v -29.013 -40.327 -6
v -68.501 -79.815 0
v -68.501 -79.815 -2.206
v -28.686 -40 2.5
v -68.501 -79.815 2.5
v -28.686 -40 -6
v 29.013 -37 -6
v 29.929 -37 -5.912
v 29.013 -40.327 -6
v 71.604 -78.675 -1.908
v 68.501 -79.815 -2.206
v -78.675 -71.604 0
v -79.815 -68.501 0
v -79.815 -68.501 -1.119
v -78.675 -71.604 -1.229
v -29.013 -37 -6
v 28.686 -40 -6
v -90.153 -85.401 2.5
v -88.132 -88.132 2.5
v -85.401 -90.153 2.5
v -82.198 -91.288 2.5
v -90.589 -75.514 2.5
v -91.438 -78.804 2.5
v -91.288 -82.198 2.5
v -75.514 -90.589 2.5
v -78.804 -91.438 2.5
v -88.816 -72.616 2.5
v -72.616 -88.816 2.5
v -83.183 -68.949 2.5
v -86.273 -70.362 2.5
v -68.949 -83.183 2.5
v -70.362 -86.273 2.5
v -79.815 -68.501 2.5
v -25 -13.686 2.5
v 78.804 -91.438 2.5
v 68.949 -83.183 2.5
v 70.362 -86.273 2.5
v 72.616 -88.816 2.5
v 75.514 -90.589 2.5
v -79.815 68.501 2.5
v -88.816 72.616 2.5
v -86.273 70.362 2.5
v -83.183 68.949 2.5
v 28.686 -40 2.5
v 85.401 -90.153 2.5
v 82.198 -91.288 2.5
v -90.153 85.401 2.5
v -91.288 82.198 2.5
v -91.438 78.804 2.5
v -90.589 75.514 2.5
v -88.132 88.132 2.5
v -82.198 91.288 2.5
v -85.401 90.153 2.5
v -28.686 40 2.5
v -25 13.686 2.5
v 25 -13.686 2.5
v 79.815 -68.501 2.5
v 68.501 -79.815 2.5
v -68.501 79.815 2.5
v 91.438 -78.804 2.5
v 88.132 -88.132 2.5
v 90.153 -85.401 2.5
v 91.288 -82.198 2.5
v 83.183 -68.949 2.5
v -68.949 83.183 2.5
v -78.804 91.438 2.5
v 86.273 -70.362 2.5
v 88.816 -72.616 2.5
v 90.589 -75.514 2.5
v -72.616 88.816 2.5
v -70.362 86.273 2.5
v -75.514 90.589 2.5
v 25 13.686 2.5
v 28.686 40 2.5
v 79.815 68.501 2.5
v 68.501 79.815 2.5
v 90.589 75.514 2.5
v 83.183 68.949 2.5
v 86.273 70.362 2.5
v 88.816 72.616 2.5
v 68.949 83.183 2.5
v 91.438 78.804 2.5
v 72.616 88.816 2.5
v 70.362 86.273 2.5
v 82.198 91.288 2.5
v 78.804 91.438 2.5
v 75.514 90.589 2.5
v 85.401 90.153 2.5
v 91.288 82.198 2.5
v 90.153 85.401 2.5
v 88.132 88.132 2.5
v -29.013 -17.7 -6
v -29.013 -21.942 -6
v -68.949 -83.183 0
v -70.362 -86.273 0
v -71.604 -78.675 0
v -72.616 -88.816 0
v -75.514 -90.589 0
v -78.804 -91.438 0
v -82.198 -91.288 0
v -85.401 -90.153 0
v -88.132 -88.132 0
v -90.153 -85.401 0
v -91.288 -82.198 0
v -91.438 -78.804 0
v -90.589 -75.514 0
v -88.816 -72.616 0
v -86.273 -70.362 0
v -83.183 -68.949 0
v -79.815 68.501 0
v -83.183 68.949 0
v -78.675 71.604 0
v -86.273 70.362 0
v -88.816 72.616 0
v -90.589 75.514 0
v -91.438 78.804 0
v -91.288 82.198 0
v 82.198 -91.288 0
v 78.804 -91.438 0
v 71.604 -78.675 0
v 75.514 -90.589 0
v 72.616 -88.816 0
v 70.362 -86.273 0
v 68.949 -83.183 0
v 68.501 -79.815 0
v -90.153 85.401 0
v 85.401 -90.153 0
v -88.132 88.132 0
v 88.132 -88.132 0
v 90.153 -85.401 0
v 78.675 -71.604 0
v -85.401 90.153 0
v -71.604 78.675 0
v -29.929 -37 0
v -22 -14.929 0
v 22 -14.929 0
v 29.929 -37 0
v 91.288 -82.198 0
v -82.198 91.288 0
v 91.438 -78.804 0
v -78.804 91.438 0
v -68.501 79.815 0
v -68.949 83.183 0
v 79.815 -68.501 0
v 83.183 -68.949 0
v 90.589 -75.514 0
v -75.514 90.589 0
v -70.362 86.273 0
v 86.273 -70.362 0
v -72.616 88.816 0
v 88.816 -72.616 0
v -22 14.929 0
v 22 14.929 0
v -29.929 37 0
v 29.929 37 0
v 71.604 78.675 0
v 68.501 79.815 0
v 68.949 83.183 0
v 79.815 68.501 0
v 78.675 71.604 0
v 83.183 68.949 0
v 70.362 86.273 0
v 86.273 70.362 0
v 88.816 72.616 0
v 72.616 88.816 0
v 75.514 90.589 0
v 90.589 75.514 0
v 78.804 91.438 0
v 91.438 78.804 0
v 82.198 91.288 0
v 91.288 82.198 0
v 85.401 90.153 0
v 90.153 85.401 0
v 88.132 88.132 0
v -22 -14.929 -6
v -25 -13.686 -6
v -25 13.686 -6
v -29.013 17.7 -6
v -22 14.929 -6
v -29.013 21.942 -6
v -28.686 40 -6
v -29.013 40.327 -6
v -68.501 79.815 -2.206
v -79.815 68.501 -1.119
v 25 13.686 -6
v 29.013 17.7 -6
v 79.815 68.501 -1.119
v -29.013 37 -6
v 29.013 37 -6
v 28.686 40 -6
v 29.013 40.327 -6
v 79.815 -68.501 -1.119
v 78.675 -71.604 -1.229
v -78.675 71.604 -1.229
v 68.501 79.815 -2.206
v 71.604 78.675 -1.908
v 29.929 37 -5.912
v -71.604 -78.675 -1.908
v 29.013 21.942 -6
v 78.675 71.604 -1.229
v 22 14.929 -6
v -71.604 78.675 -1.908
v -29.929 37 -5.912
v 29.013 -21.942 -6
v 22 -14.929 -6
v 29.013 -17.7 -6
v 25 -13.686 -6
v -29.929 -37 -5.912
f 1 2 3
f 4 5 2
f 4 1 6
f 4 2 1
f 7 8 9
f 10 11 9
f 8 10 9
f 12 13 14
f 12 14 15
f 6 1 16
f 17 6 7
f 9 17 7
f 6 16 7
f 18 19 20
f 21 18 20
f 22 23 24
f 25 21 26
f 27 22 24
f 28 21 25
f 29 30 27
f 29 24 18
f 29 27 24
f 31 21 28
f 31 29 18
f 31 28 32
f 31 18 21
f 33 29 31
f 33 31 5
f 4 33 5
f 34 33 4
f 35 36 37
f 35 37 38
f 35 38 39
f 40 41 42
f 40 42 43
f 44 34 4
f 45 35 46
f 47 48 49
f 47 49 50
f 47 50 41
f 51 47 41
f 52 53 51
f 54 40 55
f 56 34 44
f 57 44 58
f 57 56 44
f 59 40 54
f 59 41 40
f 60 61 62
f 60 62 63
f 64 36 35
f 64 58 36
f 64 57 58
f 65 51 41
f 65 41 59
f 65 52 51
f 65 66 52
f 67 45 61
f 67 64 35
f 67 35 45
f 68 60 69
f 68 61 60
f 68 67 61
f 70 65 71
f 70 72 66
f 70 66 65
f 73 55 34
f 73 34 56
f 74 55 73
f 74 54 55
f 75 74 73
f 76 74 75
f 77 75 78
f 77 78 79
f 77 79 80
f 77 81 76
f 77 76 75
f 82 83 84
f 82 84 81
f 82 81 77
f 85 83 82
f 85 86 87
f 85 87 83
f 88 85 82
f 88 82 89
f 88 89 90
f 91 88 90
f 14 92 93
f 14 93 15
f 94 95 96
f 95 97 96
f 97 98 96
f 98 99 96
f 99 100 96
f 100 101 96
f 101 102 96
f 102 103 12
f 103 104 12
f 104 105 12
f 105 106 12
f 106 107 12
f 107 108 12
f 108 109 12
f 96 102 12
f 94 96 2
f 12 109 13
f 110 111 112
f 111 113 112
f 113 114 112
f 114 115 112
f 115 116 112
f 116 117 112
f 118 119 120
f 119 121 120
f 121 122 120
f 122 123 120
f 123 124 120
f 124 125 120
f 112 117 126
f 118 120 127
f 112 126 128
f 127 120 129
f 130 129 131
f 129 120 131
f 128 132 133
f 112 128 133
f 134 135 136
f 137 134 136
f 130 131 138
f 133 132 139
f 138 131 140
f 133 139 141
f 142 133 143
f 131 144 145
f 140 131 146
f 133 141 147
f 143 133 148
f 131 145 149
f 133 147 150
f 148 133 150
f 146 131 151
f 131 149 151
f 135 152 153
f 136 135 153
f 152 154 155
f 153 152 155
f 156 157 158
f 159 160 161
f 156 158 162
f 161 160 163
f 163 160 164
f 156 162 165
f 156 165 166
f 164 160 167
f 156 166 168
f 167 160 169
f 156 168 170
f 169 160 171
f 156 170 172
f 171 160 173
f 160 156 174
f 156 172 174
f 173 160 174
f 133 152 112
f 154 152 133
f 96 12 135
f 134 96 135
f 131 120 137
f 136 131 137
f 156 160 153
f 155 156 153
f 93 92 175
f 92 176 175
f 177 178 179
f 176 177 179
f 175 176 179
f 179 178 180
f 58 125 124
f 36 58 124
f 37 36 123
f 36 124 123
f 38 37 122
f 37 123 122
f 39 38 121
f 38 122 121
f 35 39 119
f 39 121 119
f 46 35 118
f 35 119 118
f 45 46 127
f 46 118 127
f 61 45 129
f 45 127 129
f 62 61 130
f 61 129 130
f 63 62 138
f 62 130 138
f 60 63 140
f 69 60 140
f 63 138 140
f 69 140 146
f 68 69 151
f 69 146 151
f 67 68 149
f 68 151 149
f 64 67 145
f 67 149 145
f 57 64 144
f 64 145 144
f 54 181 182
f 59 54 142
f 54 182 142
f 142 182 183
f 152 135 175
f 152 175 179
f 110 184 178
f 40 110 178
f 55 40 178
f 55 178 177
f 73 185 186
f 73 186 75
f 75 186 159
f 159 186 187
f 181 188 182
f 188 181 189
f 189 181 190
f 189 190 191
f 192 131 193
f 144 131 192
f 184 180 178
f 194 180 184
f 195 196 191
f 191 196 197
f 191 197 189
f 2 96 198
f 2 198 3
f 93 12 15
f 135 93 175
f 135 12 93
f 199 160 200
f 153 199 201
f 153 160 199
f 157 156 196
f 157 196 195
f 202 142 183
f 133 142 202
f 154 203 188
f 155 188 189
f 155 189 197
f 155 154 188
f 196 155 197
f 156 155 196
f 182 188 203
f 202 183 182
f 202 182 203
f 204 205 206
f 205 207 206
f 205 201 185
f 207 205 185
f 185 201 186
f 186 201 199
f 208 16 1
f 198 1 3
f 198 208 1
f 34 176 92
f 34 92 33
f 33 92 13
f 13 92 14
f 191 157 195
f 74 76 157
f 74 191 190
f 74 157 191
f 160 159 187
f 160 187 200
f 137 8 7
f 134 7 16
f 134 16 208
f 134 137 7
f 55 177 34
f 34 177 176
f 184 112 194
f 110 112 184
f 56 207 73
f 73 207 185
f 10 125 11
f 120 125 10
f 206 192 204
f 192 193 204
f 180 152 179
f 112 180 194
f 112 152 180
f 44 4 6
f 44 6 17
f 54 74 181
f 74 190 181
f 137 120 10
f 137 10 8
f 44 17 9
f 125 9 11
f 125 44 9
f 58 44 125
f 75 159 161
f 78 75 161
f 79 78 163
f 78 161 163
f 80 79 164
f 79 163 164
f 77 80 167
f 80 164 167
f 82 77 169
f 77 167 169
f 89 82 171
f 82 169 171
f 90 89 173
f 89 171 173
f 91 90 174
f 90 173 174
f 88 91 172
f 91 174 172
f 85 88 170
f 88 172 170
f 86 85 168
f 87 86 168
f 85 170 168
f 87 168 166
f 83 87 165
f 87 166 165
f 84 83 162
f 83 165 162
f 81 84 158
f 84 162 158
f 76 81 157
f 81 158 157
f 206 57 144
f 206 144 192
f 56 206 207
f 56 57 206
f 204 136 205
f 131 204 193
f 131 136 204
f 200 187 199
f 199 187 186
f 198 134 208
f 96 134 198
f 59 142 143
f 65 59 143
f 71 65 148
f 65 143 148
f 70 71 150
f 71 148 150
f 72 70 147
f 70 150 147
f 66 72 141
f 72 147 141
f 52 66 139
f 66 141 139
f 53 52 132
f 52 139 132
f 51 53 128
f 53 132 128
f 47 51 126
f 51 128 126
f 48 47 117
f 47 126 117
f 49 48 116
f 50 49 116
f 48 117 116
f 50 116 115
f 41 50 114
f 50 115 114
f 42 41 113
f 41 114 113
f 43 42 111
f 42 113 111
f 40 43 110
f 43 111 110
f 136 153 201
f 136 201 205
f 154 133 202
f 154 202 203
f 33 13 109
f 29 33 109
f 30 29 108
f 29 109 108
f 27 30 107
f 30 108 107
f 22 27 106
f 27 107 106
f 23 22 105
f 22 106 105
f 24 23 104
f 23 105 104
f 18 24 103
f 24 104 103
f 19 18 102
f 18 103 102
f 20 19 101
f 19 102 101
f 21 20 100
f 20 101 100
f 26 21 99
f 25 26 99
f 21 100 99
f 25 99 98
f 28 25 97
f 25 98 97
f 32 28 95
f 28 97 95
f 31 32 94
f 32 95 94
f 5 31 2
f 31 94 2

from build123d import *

# Parameters (mm, degrees)
F1_DEPTH = 2.5
F3_DEPTH = 6
F5_DEPTH = 100


with BuildPart() as f1:
    # F0 (on Top) → F1 (new body)
    with BuildSketch(Plane.XY):
        with BuildLine():
            Line((-79.815194, 68.501485), (-25, 13.686292))
            Line((-25, 13.686292), (-25, -13.686292))
            Line((-25, -13.686292), (-79.815194, -68.501485))
            ThreePointArc((-79.815194, -68.501485), (-88.131728, -88.131728), (-68.501485, -79.815194))
            Line((-68.501485, -79.815194), (-28.686292, -40))
            Line((-28.686292, -40), (28.686292, -40))
            Line((28.686292, -40), (68.501485, -79.815194))
            ThreePointArc((68.501485, -79.815194), (88.131728, -88.131728), (79.815194, -68.501485))
            Line((79.815194, -68.501485), (25, -13.686292))
            Line((25, -13.686292), (25, 13.686292))
            Line((25, 13.686292), (79.815194, 68.501485))
            ThreePointArc((79.815194, 68.501485), (88.131728, 88.131728), (68.501485, 79.815194))
            Line((68.501485, 79.815194), (28.686292, 40))
            Line((28.686292, 40), (-28.686292, 40))
            Line((-28.686292, 40), (-68.501485, 79.815194))
            ThreePointArc((-68.501485, 79.815194), (-88.131728, 88.131728), (-79.815194, 68.501485))
        make_face()
    extrude(amount=F1_DEPTH)

    # F2 (on Top) → F3 (join)
    with BuildSketch(Plane.XY):
        Polygon((-29.928932, -37), (-71.603911, -78.674978), (-68.501485, -79.815194), (-28.686292, -40), (28.686292, -40), (68.501485, -79.815194), (71.603911, -78.674978), (29.928932, -37), align=None)
        Polygon((-78.674978, -71.603911), (-22, -14.928932), (-22, 14.928932), (-78.674978, 71.603911), (-79.815194, 68.501485), (-25, 13.686292), (-25, -13.686292), (-79.815194, -68.501485), align=None)
        Polygon((22, 14.928932), (22, -14.928932), (78.674978, -71.603911), (79.815194, -68.501485), (25, -13.686292), (25, 13.686292), (79.815194, 68.501485), (78.674978, 71.603911), align=None)
        Polygon((29.928932, 37), (71.603911, 78.674978), (68.501485, 79.815194), (28.686292, 40), (-28.686292, 40), (-68.501485, 79.815194), (-71.603911, 78.674978), (-29.928932, 37), align=None)
    extrude(amount=-F3_DEPTH)

    # F4 (on Front) → F5 (cut, symmetric)
    with BuildSketch(Plane.XZ):
        Polygon((-28.709985, -15.796961), (-28.709985, -6.029143), (-91.463856, 0), (-91.463856, -15.796961), align=None)
        Polygon((28.709985, -6.029143), (28.709985, -15.796961), (91.463856, -15.796961), (91.463856, 0), align=None)
    extrude(amount=F5_DEPTH, both=True, mode=Mode.SUBTRACT)


solid = f1.part
